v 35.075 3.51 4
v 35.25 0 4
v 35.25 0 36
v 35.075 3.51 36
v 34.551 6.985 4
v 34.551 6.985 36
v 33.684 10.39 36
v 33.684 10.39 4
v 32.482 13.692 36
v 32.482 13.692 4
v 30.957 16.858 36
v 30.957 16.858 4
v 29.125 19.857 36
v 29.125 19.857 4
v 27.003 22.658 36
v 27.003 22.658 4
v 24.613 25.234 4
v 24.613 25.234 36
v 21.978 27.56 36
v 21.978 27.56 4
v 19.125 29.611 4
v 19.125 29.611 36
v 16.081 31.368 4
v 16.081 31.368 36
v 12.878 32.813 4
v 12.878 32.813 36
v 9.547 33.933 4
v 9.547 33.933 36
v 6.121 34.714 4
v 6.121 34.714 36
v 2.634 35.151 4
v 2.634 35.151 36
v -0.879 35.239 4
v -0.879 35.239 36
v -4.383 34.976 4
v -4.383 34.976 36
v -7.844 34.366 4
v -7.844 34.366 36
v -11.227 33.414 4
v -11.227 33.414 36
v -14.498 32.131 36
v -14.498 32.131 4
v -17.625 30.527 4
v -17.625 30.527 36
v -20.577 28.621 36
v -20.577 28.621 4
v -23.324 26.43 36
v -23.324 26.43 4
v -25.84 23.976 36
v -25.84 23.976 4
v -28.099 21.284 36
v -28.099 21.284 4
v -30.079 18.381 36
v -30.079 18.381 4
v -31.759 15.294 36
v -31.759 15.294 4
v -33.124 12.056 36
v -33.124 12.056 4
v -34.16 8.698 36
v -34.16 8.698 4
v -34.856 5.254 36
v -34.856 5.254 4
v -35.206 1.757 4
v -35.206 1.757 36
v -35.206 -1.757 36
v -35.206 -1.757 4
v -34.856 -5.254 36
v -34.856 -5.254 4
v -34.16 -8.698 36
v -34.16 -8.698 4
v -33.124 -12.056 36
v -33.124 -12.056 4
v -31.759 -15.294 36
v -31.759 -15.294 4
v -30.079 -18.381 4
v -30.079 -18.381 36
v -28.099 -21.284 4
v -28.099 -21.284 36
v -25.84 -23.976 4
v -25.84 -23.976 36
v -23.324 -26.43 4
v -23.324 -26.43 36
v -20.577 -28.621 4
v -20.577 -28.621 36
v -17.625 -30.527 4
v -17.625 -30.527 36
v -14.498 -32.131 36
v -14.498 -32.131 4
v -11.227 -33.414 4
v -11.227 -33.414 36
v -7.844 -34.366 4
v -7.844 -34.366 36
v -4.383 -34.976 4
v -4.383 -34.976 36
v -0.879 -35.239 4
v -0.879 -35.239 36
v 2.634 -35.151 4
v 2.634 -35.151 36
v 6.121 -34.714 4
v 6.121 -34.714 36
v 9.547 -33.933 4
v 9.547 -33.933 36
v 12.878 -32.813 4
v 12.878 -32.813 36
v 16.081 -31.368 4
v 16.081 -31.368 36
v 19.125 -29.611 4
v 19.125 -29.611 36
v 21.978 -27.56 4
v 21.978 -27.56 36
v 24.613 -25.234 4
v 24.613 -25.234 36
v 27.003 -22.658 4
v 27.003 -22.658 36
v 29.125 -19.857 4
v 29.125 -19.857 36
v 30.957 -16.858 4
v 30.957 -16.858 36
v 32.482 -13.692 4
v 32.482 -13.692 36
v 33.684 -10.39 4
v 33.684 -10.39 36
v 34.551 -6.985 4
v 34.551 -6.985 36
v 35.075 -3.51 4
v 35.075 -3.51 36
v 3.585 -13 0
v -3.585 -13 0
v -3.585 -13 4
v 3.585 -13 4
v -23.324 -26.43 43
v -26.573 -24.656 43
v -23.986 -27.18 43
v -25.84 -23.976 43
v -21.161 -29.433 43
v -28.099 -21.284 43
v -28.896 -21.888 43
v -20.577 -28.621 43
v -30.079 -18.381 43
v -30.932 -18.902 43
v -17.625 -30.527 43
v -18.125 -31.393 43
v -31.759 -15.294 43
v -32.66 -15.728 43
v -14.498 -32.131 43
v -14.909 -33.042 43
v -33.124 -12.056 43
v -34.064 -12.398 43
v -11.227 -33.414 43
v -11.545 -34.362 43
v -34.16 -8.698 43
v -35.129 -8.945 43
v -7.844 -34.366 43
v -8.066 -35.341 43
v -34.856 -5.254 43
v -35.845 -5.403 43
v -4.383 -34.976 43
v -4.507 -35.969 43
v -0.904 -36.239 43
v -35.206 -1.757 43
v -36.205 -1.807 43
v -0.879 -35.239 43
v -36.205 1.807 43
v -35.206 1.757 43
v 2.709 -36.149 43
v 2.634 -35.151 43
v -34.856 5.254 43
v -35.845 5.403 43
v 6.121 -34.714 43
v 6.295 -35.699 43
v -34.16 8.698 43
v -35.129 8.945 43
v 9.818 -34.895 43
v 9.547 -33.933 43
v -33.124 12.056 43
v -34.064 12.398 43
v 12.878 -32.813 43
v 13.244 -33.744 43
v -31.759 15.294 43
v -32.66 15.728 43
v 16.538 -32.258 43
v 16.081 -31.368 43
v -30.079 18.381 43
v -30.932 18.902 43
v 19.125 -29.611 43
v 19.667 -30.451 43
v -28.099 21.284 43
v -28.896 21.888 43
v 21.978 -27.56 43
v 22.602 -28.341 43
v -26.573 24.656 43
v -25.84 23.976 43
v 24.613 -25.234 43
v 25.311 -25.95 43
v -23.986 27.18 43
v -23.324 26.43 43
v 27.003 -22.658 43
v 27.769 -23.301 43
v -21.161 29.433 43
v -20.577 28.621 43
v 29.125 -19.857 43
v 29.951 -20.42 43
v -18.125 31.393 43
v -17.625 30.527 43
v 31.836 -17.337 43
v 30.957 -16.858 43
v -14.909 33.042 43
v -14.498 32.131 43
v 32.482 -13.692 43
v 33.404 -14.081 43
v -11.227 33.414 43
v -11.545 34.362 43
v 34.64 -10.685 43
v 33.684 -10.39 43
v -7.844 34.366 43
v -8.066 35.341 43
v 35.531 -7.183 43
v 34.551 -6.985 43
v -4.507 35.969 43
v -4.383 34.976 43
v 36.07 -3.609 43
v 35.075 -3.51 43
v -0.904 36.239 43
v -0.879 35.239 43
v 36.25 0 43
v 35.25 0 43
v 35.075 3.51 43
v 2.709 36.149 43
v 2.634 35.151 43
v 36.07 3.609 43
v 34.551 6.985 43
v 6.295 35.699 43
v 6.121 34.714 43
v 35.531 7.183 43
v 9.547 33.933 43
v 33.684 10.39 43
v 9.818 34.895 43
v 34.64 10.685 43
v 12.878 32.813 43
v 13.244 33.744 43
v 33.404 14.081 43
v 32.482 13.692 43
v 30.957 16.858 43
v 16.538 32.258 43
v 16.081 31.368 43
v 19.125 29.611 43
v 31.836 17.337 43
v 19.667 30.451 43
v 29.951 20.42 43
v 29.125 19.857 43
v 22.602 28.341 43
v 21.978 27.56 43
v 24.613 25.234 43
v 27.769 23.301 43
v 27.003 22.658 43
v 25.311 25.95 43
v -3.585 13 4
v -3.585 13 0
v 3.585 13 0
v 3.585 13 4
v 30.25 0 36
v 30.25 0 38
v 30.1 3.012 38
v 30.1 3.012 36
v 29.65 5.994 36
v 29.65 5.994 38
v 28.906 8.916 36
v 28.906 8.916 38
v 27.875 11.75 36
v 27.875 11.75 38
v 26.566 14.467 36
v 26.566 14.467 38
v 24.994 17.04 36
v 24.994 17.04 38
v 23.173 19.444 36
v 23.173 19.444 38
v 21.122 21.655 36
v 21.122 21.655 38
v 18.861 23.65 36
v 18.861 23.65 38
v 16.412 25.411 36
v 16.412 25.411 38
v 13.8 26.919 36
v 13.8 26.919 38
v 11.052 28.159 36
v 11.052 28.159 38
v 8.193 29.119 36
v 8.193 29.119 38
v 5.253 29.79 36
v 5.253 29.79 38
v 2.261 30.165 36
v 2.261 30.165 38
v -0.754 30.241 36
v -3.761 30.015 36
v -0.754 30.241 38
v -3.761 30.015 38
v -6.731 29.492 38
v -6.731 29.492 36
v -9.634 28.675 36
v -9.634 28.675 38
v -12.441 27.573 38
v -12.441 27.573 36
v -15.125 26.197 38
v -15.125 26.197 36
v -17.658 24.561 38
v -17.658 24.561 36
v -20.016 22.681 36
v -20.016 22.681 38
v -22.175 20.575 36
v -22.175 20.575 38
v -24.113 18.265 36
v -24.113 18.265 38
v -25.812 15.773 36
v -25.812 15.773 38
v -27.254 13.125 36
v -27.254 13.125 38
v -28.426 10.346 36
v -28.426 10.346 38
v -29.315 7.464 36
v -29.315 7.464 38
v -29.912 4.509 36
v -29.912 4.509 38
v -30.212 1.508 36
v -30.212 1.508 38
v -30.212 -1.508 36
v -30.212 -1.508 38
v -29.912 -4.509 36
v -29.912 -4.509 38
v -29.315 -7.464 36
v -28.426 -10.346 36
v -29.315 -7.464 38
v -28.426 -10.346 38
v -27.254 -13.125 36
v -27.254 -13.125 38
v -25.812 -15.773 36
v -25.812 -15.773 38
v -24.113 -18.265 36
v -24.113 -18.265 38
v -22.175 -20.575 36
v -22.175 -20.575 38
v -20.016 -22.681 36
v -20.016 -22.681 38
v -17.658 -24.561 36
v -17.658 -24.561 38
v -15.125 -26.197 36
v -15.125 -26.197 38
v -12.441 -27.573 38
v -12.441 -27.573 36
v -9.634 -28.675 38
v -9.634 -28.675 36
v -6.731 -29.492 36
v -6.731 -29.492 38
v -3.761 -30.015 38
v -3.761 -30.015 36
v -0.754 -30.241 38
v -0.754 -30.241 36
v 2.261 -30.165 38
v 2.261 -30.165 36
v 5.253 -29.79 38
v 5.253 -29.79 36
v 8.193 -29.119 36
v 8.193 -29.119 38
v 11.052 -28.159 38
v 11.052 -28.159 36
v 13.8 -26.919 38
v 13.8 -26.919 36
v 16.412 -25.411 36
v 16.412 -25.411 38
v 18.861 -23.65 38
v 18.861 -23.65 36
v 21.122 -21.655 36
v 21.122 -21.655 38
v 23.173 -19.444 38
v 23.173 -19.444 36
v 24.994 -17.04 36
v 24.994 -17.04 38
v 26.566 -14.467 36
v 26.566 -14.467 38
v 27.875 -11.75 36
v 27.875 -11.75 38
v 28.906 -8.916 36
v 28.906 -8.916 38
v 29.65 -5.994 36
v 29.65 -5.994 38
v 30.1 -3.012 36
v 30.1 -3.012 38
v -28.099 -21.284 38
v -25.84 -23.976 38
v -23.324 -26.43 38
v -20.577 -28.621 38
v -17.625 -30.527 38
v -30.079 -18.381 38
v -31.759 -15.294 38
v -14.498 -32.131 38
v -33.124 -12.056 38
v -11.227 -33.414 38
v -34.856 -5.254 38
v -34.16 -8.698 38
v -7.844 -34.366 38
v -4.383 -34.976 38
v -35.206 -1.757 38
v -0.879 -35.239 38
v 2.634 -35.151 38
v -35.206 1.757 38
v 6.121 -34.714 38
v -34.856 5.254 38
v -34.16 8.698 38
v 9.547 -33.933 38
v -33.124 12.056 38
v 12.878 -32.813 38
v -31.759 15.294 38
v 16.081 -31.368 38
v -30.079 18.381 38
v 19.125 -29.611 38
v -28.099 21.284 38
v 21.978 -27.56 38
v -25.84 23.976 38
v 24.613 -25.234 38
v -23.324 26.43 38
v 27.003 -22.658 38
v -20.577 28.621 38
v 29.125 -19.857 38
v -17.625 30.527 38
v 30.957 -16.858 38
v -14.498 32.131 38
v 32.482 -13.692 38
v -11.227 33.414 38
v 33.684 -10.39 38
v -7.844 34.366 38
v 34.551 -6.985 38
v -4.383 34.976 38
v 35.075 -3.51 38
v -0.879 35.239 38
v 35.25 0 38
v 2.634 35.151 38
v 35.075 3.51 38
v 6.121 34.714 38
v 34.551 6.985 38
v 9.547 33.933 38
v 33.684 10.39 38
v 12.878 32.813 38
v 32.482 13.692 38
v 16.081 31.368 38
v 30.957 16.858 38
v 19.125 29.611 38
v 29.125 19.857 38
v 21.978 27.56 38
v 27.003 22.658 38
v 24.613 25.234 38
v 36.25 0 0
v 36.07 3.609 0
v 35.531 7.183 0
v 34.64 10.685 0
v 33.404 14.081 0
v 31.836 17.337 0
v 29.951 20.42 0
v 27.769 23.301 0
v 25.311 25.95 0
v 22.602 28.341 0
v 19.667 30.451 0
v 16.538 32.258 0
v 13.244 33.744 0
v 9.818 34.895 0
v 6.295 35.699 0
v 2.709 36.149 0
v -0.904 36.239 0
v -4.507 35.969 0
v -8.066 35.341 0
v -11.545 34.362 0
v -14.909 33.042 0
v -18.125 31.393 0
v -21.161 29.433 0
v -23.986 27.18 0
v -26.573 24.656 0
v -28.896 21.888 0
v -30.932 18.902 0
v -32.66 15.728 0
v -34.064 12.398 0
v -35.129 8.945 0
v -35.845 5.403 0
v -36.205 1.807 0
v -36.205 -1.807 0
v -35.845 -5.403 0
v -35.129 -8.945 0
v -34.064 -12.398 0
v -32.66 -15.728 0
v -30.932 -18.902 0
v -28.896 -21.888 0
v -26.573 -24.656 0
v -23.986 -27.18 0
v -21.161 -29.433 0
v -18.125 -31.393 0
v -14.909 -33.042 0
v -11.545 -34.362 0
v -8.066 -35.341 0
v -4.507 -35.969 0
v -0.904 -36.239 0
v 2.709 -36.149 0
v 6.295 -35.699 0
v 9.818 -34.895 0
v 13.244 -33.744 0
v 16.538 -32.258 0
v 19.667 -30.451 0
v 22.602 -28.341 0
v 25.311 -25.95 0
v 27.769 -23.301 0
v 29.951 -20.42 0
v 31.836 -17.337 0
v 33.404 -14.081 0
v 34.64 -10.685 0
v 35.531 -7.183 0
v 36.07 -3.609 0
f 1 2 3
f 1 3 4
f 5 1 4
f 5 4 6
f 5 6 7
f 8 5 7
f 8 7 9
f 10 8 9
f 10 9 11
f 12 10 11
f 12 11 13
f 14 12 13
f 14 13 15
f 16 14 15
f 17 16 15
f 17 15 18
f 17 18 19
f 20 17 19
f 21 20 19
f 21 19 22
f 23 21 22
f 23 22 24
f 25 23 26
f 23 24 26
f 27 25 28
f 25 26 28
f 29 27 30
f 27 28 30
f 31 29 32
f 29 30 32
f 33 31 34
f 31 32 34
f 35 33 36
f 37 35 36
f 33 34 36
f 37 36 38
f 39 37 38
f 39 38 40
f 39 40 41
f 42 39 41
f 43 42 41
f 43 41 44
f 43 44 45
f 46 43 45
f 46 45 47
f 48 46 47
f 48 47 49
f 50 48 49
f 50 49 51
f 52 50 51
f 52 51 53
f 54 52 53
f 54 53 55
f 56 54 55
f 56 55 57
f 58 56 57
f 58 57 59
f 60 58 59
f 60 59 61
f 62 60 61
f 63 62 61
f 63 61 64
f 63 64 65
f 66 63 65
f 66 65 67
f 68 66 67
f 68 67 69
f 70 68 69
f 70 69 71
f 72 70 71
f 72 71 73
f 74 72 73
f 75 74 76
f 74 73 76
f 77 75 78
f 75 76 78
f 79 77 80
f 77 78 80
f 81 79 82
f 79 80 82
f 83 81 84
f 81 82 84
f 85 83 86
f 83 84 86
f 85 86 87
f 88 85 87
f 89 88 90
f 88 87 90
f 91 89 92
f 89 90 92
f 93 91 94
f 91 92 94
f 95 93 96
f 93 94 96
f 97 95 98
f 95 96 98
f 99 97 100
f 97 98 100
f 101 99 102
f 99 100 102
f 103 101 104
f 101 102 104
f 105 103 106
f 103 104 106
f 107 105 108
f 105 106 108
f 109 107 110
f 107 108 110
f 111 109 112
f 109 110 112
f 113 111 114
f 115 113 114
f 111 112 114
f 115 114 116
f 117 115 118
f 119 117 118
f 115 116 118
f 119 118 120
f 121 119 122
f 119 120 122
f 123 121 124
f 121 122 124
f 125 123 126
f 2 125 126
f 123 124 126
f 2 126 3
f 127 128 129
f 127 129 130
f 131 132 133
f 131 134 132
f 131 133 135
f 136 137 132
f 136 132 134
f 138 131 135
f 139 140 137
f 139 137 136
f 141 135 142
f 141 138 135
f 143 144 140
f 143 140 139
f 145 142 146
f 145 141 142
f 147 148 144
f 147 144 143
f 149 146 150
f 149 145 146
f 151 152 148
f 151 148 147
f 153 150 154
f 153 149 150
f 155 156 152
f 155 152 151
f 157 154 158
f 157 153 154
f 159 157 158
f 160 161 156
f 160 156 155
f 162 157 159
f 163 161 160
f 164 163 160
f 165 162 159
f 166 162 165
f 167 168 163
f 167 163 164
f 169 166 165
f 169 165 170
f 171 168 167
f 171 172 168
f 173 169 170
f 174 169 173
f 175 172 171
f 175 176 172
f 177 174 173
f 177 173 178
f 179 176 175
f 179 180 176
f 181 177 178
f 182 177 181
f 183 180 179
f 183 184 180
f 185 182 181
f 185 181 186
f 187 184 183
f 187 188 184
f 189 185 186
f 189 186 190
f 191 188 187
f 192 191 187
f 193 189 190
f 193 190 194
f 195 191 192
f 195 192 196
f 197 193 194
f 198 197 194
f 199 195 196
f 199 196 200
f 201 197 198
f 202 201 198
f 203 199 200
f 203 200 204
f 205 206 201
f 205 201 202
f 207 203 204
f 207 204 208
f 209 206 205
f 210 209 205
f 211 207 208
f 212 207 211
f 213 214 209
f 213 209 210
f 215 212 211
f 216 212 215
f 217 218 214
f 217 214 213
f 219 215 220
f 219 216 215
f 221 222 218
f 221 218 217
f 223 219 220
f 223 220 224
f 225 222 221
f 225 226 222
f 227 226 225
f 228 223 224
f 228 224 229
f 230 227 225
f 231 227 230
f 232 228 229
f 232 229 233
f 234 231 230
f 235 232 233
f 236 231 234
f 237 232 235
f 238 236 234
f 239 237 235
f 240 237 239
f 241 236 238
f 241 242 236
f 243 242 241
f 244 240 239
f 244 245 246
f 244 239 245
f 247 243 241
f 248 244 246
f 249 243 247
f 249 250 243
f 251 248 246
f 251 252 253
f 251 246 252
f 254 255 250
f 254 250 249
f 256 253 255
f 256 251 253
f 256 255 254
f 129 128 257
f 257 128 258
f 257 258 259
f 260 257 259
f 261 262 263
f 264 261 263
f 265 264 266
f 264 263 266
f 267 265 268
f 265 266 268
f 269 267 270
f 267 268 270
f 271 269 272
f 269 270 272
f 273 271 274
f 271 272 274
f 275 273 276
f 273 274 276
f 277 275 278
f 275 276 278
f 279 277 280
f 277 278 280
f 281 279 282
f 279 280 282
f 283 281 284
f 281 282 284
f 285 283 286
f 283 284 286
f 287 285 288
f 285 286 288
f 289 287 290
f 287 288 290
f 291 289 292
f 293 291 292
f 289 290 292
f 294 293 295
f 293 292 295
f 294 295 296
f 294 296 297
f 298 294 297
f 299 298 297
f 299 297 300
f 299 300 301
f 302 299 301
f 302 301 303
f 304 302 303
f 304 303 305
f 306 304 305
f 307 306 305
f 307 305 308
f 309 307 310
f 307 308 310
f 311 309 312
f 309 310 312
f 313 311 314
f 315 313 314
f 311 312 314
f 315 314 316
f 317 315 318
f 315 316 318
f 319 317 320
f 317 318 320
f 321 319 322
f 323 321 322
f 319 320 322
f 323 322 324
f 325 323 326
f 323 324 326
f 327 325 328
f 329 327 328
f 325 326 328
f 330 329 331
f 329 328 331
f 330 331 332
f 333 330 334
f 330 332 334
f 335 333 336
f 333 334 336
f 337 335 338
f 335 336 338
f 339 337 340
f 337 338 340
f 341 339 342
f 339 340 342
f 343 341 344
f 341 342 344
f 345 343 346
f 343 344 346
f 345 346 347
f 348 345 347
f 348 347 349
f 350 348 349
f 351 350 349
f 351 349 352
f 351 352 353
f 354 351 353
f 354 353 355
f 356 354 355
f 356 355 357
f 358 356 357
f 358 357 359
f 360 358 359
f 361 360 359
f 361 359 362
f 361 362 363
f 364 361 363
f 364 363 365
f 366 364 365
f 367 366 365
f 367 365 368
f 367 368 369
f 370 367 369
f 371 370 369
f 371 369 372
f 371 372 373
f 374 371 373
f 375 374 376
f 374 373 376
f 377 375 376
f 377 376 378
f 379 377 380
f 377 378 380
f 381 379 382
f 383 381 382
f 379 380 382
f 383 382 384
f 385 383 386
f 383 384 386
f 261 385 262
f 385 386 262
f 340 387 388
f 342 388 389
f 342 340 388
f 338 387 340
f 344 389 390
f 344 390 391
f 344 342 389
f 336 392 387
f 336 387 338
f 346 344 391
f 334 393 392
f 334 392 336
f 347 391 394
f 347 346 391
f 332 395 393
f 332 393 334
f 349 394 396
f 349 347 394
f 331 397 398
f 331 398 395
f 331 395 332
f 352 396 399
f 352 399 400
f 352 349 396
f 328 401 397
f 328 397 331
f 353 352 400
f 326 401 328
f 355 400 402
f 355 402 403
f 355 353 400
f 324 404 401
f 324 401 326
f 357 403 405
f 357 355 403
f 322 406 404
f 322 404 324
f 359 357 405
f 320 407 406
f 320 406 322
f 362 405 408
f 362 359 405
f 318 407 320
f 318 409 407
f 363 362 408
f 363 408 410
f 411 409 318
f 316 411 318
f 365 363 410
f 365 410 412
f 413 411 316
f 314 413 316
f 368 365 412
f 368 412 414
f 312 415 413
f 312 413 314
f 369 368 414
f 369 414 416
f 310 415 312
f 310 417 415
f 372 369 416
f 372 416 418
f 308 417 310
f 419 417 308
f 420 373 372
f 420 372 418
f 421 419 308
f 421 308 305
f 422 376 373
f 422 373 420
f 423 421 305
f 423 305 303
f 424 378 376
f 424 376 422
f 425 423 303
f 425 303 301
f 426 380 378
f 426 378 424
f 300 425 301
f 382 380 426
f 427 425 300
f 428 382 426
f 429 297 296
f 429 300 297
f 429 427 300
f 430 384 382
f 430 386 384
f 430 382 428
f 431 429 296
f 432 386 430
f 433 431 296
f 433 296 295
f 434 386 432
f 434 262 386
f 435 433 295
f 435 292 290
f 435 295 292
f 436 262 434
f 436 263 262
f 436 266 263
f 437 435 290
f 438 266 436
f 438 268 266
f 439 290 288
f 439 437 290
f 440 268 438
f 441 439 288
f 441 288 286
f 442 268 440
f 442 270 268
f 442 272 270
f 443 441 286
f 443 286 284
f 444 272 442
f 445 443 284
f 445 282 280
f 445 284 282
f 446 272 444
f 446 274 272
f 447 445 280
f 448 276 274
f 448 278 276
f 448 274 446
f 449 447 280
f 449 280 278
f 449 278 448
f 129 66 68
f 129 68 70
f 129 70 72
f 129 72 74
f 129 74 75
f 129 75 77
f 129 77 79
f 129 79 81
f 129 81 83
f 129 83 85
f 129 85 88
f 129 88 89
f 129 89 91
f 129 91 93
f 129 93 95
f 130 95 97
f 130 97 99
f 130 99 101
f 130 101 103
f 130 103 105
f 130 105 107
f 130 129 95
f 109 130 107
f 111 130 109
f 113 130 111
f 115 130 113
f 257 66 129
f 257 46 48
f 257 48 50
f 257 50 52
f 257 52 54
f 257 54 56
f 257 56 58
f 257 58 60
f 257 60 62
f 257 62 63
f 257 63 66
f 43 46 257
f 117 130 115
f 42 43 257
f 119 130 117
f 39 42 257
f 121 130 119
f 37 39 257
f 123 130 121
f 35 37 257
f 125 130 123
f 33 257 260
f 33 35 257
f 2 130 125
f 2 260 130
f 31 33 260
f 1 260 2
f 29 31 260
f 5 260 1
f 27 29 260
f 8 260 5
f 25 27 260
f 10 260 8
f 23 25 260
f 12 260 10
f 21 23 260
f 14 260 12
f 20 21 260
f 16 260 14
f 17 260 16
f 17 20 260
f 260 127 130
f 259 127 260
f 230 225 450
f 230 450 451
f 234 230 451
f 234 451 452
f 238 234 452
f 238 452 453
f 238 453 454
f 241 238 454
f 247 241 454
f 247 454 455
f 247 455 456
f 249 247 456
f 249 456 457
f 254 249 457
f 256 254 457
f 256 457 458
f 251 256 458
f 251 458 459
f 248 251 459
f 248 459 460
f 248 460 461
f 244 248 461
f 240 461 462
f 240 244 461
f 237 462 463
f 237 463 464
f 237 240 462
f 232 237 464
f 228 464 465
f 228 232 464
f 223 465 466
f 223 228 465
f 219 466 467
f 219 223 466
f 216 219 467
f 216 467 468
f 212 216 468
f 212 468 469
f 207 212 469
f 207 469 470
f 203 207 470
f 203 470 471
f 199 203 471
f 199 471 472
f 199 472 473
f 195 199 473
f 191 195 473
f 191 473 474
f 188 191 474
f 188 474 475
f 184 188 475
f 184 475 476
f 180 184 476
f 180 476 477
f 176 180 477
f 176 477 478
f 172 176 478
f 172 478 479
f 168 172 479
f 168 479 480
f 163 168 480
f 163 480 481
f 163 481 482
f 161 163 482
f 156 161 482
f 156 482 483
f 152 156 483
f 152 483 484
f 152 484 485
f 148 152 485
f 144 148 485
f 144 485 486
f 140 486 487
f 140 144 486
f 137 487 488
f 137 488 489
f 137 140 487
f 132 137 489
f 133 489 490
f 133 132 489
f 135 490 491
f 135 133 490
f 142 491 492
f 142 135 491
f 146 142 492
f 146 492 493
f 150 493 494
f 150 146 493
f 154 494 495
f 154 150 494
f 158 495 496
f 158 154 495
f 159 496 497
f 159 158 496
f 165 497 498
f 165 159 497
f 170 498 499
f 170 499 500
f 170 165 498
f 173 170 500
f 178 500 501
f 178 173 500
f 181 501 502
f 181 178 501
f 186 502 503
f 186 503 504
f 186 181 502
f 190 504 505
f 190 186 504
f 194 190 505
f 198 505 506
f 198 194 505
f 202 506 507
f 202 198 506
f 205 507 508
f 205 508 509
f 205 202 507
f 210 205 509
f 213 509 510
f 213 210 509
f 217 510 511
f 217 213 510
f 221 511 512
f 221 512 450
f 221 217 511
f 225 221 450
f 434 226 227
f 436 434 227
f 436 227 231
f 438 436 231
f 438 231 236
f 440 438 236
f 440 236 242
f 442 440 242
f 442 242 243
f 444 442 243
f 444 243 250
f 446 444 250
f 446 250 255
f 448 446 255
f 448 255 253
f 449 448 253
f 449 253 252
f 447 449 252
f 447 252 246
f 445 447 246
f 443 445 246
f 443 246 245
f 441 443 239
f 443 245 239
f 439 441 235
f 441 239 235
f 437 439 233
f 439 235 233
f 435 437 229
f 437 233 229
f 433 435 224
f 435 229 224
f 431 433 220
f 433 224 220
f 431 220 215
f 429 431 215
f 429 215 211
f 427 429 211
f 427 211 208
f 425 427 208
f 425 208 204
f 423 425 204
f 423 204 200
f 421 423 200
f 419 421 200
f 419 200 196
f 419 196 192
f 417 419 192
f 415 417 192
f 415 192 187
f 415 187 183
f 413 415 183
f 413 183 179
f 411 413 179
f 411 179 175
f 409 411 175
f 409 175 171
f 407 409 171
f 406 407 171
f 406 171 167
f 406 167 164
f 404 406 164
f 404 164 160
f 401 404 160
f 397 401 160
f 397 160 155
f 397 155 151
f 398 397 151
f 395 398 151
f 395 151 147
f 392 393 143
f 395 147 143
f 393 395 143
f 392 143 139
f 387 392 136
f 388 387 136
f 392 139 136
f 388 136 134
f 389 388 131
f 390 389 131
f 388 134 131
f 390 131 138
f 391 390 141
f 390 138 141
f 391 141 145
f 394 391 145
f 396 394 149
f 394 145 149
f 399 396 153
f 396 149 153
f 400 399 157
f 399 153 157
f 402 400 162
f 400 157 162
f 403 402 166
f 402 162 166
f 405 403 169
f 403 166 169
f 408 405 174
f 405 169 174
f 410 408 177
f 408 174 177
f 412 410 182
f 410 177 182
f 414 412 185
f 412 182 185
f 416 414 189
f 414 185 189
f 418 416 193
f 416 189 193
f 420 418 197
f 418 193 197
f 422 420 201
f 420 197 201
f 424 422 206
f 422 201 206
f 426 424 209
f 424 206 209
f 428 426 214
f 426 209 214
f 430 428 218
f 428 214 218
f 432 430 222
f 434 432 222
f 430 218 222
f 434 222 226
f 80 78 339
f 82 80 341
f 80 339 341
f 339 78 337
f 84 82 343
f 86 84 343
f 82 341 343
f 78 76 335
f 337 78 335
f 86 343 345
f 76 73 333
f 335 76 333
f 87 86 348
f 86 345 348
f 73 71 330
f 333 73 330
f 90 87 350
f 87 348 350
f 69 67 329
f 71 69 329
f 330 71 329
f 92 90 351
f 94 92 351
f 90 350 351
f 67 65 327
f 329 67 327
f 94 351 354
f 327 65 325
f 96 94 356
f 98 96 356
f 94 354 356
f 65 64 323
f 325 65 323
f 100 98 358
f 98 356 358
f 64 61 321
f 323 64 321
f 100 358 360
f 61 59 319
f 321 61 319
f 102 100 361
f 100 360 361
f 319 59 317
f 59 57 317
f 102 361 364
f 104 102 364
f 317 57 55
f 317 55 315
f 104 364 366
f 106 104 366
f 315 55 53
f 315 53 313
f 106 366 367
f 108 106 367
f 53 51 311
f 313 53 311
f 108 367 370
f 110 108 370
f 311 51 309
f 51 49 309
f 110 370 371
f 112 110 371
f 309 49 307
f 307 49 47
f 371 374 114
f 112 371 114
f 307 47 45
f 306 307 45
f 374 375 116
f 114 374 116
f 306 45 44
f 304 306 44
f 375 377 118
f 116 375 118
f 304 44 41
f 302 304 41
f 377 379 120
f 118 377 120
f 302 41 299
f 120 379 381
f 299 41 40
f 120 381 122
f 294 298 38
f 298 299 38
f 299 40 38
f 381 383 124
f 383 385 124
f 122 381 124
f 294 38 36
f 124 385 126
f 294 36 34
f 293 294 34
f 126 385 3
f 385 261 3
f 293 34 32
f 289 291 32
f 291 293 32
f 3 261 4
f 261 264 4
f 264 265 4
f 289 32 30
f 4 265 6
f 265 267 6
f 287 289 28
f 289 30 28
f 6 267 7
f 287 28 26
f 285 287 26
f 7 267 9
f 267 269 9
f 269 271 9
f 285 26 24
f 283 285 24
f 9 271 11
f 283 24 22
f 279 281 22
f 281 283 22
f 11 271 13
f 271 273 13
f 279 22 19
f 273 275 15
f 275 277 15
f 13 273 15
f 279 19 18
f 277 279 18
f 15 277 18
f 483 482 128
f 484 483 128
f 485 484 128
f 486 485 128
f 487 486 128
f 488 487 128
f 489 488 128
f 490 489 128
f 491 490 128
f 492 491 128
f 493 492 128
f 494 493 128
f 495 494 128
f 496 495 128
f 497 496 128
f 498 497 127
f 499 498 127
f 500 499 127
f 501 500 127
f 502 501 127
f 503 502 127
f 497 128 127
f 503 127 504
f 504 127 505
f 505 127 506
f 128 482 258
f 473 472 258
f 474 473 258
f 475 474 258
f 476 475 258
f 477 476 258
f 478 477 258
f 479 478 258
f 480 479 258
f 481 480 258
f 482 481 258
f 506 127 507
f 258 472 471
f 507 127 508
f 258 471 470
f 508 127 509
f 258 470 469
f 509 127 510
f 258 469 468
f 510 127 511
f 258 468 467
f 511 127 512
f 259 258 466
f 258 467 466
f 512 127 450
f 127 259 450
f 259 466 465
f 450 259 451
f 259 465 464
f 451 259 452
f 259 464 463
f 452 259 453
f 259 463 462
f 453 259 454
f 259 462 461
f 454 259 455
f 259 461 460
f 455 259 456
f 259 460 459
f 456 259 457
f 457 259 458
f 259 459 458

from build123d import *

# Parameters (mm, degrees)
F0_R     = 36.25
F1_DEPTH = 43
F2_R     = 35.25
F3_DEPTH = 39
F5_R     = 36.25
F5_R_2   = 30.25
F6_DEPTH = 2
F7_W     = 7.17
F7_H     = 26
F8_DEPTH = 43.001


with BuildPart() as f1:
    # F0 (on Top) → F1 (new body)
    with BuildSketch(Plane.XY):
        Circle(F0_R)
    extrude(amount=F1_DEPTH)

    # F2 (on face) → F3 (cut)
    with BuildSketch(Plane.XY.offset(43)):
        Circle(F2_R)
    extrude(amount=-F3_DEPTH, mode=Mode.SUBTRACT)

    # F5 (on offset) → F6 (join)
    with BuildSketch(Plane.XY.offset(38)):
        Circle(F5_R)
        Circle(F5_R_2, mode=Mode.SUBTRACT)
    extrude(amount=-F6_DEPTH)

    # F7 (on Top) → F8 (cut, through all)
    with BuildSketch(Plane.XY):
        Rectangle(F7_W, F7_H)
    extrude(amount=F8_DEPTH, mode=Mode.SUBTRACT)


solid = f1.part
